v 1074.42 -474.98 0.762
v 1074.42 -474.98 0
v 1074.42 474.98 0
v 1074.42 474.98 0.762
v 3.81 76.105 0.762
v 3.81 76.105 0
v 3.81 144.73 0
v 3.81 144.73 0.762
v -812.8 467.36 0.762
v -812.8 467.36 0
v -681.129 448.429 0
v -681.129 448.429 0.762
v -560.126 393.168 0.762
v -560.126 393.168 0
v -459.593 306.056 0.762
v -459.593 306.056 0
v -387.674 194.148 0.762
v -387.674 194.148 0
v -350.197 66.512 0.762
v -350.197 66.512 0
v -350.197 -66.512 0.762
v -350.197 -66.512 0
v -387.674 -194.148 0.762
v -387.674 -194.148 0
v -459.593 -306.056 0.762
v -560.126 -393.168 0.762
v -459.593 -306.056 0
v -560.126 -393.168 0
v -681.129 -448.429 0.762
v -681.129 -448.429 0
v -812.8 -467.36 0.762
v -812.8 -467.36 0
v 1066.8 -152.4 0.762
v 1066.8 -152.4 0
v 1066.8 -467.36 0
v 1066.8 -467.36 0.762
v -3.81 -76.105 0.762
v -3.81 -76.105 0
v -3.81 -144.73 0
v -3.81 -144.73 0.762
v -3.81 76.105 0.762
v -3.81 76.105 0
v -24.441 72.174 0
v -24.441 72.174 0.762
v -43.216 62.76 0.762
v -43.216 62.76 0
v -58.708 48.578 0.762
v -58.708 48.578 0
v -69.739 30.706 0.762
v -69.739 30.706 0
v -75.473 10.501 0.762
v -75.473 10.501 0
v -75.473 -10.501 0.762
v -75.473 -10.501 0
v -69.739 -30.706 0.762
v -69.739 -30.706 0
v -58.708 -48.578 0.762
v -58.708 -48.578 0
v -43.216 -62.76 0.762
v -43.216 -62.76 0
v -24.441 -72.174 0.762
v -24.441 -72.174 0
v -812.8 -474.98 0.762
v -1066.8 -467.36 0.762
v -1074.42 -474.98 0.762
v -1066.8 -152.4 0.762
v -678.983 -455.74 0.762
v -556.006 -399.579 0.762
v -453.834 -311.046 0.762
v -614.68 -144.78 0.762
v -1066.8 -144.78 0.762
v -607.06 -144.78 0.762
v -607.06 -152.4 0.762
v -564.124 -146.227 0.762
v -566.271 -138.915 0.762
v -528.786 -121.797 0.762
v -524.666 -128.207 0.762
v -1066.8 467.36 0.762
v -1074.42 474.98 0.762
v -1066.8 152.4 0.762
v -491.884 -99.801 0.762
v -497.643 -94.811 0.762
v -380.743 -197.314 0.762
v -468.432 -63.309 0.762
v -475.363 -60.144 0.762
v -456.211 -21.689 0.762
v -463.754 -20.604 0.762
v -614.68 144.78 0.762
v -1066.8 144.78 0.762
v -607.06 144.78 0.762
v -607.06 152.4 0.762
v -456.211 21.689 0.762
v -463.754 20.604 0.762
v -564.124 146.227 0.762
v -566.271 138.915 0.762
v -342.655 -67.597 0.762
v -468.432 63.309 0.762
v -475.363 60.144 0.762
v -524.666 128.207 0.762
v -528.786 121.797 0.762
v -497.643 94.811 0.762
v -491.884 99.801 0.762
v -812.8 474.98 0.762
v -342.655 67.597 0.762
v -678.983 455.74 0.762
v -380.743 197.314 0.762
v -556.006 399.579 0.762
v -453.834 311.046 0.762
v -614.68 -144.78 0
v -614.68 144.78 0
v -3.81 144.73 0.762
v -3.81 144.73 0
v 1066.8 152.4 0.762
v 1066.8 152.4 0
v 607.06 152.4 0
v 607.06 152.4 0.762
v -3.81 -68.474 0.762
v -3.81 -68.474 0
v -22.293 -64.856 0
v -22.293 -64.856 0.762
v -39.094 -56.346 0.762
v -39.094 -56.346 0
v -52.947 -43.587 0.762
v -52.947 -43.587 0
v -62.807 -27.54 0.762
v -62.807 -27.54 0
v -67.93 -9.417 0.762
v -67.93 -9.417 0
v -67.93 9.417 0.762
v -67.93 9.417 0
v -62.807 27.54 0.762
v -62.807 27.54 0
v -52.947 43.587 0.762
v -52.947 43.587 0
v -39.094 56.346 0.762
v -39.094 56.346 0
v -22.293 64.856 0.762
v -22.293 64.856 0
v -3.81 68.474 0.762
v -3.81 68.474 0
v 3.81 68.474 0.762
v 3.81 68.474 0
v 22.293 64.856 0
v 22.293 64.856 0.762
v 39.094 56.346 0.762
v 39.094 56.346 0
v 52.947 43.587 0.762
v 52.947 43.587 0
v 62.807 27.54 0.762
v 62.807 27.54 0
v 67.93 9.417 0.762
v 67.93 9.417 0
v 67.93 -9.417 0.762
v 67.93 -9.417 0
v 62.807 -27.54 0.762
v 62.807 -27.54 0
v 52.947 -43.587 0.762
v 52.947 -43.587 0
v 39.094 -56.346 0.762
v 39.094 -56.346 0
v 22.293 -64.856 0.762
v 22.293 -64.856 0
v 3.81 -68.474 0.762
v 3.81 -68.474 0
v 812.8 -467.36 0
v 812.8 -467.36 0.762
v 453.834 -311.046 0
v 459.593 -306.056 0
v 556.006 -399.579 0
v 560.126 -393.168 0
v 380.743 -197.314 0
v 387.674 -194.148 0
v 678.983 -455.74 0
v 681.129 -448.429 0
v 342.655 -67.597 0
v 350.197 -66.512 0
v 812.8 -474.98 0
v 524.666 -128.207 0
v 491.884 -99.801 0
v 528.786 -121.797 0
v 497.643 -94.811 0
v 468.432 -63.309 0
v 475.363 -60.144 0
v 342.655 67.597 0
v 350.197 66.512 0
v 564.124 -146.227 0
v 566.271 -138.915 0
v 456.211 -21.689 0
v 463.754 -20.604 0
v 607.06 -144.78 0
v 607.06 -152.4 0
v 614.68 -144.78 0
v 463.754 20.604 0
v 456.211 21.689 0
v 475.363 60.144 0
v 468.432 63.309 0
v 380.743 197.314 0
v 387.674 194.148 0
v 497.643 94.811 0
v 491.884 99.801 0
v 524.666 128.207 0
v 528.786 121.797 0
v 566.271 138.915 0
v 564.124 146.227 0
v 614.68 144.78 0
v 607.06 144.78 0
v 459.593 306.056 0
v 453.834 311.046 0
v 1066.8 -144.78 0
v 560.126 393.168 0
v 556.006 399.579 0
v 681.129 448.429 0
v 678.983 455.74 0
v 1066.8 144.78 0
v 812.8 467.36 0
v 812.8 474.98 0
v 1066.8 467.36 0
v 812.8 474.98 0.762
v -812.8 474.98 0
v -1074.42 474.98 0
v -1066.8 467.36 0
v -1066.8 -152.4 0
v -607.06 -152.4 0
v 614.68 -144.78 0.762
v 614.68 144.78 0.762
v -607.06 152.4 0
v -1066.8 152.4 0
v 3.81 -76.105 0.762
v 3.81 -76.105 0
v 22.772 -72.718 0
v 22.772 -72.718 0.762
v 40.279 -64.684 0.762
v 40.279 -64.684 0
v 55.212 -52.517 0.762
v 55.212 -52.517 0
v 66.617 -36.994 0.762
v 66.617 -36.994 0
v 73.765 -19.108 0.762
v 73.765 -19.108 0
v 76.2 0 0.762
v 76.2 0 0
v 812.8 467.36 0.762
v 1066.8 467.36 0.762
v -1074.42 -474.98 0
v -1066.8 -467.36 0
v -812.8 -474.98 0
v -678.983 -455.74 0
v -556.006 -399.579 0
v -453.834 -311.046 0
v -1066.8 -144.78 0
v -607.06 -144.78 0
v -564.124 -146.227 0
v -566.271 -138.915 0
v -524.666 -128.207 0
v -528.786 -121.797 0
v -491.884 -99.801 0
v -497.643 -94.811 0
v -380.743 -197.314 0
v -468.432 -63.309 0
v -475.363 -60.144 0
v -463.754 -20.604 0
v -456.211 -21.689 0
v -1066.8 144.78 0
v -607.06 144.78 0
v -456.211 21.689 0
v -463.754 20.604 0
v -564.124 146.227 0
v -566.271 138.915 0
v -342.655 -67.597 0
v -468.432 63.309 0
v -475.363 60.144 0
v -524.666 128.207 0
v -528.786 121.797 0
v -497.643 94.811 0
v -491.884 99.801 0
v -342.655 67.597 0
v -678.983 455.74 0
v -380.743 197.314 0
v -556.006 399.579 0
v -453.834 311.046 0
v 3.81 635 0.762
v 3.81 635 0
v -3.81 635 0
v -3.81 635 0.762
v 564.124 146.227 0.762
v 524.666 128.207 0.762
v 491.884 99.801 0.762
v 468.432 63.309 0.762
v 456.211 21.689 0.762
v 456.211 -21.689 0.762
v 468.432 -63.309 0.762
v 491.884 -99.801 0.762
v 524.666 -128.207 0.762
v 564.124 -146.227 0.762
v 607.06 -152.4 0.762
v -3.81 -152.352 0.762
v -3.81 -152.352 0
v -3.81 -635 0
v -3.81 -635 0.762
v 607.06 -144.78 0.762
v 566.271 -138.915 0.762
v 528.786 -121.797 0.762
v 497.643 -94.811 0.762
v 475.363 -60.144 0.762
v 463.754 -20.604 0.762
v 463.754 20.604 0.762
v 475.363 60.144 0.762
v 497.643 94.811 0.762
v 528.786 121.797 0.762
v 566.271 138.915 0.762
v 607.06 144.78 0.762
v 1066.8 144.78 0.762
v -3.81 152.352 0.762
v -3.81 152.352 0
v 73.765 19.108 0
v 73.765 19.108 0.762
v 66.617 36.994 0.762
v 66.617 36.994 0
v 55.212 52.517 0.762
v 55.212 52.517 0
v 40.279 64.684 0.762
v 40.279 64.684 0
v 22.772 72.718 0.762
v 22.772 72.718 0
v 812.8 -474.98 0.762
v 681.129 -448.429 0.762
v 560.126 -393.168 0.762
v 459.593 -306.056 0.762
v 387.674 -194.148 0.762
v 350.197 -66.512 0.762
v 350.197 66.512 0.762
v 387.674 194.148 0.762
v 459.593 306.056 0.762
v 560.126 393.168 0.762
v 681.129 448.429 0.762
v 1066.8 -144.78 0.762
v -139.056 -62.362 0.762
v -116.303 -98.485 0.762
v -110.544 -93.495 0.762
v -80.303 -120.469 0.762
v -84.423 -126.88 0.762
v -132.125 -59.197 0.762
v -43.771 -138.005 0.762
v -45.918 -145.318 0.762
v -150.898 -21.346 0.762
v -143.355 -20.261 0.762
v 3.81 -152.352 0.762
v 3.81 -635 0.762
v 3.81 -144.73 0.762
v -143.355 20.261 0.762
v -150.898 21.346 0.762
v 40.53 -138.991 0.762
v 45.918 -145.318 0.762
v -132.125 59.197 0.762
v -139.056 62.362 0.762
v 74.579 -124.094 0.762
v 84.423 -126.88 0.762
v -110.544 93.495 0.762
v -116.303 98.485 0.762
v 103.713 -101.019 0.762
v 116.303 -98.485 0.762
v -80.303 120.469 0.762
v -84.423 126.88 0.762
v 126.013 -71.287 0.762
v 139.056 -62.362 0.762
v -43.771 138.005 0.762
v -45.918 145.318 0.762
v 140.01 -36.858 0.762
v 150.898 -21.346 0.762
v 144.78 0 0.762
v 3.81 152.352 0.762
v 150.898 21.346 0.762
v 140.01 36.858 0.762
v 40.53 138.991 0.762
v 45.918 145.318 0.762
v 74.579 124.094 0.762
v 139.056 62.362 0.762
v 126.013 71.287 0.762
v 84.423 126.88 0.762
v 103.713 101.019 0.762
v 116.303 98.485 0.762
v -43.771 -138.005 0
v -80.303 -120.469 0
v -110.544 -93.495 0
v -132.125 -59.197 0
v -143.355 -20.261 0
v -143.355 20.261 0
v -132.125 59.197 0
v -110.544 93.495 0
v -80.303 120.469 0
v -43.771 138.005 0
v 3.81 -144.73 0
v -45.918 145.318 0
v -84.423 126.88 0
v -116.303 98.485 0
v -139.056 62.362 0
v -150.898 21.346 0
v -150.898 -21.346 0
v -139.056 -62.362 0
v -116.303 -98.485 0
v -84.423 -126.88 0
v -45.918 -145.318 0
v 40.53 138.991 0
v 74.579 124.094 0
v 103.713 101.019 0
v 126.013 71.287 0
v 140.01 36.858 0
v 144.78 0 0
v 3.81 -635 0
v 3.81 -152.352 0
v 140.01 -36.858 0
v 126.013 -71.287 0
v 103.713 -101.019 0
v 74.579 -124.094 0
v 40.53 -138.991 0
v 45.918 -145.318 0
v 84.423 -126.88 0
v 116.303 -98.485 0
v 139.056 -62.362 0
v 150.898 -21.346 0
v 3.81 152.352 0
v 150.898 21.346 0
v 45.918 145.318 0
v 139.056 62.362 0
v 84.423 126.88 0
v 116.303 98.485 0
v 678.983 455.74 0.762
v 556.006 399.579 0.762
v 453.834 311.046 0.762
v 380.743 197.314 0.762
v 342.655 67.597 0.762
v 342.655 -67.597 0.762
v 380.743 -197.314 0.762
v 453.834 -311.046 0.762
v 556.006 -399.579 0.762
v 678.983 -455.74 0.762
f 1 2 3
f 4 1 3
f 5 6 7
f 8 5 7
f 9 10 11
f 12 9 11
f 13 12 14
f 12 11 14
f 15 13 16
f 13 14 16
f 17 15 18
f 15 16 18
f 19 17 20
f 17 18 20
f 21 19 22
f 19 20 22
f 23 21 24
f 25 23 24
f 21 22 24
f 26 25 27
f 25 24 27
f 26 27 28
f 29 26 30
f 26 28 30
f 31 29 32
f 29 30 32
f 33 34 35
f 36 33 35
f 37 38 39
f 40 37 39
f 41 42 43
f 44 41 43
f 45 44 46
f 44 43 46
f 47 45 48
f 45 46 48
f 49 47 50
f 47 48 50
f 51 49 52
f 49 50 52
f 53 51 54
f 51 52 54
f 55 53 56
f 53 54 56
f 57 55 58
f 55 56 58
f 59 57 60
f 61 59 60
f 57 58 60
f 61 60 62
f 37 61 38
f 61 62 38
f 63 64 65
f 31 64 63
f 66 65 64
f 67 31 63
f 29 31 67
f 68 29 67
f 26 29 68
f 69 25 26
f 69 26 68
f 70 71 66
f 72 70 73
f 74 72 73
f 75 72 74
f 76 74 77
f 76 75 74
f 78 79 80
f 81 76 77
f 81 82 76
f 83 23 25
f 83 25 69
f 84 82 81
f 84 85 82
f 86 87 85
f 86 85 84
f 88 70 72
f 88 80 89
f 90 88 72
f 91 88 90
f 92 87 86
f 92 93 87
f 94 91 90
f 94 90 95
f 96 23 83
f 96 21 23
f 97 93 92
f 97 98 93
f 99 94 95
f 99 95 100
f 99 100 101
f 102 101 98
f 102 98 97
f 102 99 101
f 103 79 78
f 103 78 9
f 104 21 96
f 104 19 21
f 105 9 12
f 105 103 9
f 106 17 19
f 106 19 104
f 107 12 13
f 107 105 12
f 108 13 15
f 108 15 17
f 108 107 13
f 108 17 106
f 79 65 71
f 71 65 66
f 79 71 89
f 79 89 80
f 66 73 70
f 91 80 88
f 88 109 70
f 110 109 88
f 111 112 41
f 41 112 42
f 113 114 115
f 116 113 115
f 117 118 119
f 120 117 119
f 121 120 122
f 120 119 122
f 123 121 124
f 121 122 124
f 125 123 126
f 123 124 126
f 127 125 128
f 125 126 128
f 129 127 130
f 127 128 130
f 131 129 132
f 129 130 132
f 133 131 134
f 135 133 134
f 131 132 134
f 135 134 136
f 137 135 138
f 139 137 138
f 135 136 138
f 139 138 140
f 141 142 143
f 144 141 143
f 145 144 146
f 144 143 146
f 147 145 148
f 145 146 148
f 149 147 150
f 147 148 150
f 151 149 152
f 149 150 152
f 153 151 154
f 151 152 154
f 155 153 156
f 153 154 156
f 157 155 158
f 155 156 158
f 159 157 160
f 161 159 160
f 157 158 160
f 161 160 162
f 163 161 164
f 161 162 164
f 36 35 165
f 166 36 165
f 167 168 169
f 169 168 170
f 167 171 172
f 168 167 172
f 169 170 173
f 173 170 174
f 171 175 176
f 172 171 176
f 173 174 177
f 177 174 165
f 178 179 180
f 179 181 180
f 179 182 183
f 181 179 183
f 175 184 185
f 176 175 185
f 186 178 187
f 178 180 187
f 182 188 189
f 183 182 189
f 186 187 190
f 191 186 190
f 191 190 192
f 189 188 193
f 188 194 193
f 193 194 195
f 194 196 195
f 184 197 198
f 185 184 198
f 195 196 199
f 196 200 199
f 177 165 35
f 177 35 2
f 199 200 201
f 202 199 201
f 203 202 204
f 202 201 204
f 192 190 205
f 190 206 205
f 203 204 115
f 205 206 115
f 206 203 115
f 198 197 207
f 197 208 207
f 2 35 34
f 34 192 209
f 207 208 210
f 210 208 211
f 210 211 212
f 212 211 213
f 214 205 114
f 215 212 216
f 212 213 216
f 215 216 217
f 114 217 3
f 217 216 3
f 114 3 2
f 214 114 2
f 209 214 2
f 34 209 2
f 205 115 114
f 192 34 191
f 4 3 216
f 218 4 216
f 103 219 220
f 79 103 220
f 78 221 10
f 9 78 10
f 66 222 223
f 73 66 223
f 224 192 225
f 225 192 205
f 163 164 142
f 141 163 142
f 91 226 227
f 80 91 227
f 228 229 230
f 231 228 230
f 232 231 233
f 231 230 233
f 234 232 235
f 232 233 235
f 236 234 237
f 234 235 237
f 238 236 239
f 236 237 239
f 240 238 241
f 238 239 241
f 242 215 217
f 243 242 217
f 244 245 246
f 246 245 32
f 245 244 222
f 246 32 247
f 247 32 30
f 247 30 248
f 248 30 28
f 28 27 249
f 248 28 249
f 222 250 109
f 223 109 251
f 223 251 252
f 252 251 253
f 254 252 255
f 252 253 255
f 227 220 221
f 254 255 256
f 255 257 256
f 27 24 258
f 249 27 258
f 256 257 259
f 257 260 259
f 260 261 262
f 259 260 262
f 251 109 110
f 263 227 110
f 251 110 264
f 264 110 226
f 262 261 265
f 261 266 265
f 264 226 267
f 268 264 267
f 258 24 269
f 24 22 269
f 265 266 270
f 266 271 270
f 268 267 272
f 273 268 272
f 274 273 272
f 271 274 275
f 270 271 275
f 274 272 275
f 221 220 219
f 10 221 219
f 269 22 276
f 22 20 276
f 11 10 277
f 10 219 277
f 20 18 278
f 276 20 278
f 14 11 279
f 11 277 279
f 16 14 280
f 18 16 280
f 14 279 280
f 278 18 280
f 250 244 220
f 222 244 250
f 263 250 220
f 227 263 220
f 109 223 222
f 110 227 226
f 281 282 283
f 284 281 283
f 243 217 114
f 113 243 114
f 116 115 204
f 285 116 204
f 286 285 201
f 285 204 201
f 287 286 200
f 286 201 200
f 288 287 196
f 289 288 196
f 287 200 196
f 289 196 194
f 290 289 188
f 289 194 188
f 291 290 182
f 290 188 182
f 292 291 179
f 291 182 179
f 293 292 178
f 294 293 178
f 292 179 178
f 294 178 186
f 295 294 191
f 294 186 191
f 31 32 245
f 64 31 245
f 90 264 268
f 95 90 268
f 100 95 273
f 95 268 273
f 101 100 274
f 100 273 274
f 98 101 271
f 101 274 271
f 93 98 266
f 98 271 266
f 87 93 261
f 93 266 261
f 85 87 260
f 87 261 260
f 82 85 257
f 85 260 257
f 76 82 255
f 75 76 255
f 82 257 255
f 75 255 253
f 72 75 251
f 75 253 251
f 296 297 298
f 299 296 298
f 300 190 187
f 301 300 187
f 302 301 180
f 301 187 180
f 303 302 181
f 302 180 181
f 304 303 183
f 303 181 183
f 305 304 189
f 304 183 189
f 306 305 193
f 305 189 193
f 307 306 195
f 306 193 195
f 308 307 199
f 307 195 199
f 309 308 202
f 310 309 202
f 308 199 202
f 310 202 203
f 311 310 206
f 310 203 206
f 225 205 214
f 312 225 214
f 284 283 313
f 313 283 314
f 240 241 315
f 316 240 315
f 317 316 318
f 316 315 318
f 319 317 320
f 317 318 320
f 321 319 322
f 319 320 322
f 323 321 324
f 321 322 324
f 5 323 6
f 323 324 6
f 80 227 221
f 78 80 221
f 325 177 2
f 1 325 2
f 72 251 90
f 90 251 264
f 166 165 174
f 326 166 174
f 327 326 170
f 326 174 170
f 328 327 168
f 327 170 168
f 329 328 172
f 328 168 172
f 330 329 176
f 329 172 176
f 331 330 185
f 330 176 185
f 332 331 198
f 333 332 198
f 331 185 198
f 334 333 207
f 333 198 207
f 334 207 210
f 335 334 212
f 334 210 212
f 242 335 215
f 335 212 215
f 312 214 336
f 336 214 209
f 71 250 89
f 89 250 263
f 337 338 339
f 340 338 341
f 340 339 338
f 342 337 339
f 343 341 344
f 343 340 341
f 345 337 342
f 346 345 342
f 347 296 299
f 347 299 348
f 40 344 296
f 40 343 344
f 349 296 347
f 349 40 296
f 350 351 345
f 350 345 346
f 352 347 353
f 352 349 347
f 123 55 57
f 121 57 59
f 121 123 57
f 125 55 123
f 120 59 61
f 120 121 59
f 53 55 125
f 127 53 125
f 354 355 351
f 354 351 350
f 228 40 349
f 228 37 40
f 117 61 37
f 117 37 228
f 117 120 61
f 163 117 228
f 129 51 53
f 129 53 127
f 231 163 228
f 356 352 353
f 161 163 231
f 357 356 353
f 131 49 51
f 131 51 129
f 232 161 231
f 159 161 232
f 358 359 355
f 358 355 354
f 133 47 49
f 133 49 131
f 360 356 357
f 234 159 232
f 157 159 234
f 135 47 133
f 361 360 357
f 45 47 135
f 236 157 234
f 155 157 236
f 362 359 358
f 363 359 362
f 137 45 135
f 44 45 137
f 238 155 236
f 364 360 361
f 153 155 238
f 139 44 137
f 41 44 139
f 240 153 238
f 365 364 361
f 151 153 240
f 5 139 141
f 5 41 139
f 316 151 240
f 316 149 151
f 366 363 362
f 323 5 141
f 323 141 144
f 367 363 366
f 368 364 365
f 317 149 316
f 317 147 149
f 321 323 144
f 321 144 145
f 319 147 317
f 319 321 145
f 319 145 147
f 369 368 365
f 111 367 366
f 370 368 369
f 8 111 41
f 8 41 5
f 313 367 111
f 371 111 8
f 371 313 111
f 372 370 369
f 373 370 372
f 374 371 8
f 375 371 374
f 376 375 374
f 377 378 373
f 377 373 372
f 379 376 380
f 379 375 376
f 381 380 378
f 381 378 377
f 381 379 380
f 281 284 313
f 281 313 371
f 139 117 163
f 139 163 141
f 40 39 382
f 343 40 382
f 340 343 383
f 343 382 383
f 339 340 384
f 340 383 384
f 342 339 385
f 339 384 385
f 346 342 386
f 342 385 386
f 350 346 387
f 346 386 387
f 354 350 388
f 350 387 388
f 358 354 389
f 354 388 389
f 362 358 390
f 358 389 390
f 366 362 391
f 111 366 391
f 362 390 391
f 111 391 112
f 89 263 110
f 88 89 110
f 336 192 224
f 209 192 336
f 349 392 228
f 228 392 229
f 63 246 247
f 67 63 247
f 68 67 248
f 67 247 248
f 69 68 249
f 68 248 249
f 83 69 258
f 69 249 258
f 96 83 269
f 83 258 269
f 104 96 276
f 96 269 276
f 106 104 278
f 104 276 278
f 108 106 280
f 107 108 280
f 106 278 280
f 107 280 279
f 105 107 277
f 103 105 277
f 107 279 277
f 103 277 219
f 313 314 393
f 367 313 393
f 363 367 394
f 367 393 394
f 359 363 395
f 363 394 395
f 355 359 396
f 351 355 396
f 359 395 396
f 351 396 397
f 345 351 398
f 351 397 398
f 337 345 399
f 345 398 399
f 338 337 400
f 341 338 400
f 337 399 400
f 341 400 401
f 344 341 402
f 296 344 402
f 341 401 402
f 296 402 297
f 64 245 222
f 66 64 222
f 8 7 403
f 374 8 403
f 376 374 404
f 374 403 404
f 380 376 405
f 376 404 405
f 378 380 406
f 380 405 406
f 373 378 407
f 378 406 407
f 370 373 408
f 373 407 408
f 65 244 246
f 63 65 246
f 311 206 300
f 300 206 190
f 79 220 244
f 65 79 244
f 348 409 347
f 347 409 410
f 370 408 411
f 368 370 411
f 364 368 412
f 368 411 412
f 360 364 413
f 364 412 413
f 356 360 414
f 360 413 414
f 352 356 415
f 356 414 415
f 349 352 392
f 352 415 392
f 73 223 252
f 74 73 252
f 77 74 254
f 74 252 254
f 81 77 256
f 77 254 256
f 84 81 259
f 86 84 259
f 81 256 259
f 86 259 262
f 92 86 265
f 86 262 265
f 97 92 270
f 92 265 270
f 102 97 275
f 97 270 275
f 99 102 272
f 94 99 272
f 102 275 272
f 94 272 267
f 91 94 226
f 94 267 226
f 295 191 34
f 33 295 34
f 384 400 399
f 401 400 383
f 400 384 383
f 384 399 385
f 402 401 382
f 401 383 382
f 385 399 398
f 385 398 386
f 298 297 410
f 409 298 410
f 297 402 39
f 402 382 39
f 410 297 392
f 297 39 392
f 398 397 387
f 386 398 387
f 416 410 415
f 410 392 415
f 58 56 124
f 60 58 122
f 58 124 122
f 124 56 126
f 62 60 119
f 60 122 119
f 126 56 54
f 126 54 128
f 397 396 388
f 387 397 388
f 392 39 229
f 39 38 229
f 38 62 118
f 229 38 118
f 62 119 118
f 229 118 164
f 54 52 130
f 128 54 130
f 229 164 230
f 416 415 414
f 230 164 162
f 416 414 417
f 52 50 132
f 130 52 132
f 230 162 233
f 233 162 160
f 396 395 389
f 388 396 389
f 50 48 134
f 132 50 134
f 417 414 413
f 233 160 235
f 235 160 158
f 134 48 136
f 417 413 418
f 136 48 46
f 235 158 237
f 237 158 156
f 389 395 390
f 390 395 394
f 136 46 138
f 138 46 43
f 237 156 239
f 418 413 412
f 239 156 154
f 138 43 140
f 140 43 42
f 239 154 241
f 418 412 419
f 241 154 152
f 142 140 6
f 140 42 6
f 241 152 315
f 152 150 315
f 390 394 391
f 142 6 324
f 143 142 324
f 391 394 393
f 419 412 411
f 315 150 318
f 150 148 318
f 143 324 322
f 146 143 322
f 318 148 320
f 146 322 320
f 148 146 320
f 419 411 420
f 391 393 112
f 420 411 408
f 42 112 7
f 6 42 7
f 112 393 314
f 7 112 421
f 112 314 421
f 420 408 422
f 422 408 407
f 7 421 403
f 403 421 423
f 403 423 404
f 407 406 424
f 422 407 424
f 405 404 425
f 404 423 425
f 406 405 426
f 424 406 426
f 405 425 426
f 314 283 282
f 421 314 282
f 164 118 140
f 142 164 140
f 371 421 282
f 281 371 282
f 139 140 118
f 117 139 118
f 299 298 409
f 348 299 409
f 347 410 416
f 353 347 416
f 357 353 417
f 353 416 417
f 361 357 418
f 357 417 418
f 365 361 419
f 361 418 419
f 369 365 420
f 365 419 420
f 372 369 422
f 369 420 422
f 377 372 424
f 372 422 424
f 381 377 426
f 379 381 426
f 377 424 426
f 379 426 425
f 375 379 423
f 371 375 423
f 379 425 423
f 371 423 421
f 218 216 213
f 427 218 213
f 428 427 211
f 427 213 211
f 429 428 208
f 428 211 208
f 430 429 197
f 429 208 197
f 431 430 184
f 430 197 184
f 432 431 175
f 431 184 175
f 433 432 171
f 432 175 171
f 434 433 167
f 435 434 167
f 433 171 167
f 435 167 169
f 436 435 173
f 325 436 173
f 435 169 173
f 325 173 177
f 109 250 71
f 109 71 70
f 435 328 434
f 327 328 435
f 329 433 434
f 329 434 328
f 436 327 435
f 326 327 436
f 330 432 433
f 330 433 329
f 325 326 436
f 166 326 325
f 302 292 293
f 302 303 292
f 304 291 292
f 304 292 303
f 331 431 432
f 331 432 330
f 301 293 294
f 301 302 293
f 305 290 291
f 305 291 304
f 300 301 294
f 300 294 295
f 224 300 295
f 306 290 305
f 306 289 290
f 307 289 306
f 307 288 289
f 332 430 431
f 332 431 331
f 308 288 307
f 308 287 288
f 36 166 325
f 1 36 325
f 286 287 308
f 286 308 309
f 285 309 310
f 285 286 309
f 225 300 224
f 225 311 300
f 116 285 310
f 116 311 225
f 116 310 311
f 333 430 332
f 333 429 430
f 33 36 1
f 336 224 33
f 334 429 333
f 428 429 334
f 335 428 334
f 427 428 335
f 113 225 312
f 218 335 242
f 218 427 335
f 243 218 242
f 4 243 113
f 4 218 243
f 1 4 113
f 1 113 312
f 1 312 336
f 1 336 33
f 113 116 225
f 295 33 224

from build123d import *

# Parameters (mm, degrees)
F0_W     = 254
F0_H     = 7.62
F0_W_2   = 7.62
F0_H_2   = 289.56
F0_W_3   = 452.12
F1_DEPTH = 0.762


with BuildPart() as f1:
    # F0 (on Top) → F1 (new body)
    with BuildSketch(Plane.XY):
        with BuildLine():
            Line((-1066.8, -467.36), (-1066.8, -474.98))
            Line((-1066.8, -474.98), (-812.8, -474.98))
            ThreePointArc((-812.8, -474.98), (-337.82, 0), (-812.8, 474.98))
            Line((-812.8, 474.98), (-812.8, 467.36))
            ThreePointArc((-812.8, 467.36), (-345.44, 0), (-812.8, -467.36))
            Line((-812.8, -467.36), (-1066.8, -467.36))
        make_face()
        with Locations((-939.8, 471.17)):
            Rectangle(F0_W, F0_H)
        with Locations((-610.87, 0)):
            Rectangle(F0_W_2, F0_H_2)
        with Locations((-840.74, 148.59)):
            Rectangle(F0_W_3, F0_H)
        with Locations((-610.87, 148.59)):
            Rectangle(F0_W_2, F0_H)
        with BuildLine():
            Line((-607.06, -144.78), (-607.06, -152.4))
            ThreePointArc((-607.06, -152.4), (-454.66, 0), (-607.06, 152.4))
            Line((-607.06, 152.4), (-607.06, 144.78))
            ThreePointArc((-607.06, 144.78), (-462.28, 0), (-607.06, -144.78))
        make_face()
        with Locations((-840.74, -148.59)):
            Rectangle(F0_W_3, F0_H)
        with Locations((-610.87, -148.59)):
            Rectangle(F0_W_2, F0_H)
        Polygon((-1074.42, -474.98), (-1066.8, -474.98), (-1066.8, -467.36), (-1066.8, -152.4), (-1066.8, -144.78), (-1066.8, 144.78), (-1066.8, 152.4), (-1066.8, 467.36), (-1066.8, 474.98), (-1074.42, 474.98), align=None)
    extrude(amount=F1_DEPTH)


with BuildPart() as f1b:
    # F0 (on Top) → F1, piece 2 (new body)
    with BuildSketch(Plane.XY):
        with BuildLine():
            ThreePointArc((-3.81, 76.1046903942), (-76.2, 0), (-3.81, -76.1046903942))
            Line((-3.81, -76.1046903942), (-3.81, -68.4740848789))
            ThreePointArc((-3.81, -68.4740848789), (-68.58, 0), (-3.81, 68.4740848789))
            Line((-3.81, 68.4740848789), (-3.81, 76.1046903942))
        make_face()
        with BuildLine():
            Line((3.81, -68.4740848789), (3.81, -76.1046903942))
            ThreePointArc((3.81, -76.1046903942), (55.212145403, -52.5172257455), (76.2, 0))
            ThreePointArc((76.2, 0), (55.212145403, 52.5172257455), (3.81, 76.1046903942))
            Line((3.81, 76.1046903942), (3.81, 68.4740848789))
            ThreePointArc((3.81, 68.4740848789), (49.8222149247, 47.1270973008), (68.58, 0))
            ThreePointArc((68.58, 0), (49.8222149247, -47.1270973008), (3.81, -68.4740848789))
        make_face()
        with BuildLine():
            ThreePointArc((3.81, 76.1046903942), (1.9055959646, 76.176168872), (0, 76.2))
            Line((0, 76.2), (0, 68.58))
            ThreePointArc((0, 68.58), (1.9057359479, 68.553516106), (3.81, 68.4740848789))
            Line((3.81, 68.4740848789), (3.81, 76.1046903942))
        make_face()
        with BuildLine():
            ThreePointArc((0, 76.2), (-1.9055959646, 76.176168872), (-3.81, 76.1046903942))
            Line((-3.81, 76.1046903942), (-3.81, 68.4740848789))
            ThreePointArc((-3.81, 68.4740848789), (-1.9057359479, 68.553516106), (0, 68.58))
            Line((0, 68.58), (0, 76.2))
        make_face()
        with BuildLine():
            ThreePointArc((-3.81, 152.3523675563), (-152.4, 0), (-3.81, -152.3523675563))
            Line((-3.81, -152.3523675563), (-3.81, -144.7298597388))
            ThreePointArc((-3.81, -144.7298597388), (-144.78, 0), (-3.81, 144.7298597388))
            Line((-3.81, 144.7298597388), (-3.81, 152.3523675563))
        make_face()
        with BuildLine():
            ThreePointArc((0, 152.4), (-1.9051488688, 152.3880914238), (-3.81, 152.3523675563))
            Line((-3.81, 152.3523675563), (-3.81, 144.7298597388))
            ThreePointArc((-3.81, 144.7298597388), (-1.9051649565, 144.767464392), (0, 144.78))
            Line((0, 144.78), (0, 152.4))
        make_face()
        with BuildLine():
            ThreePointArc((3.81, 152.3523675563), (1.9051488688, 152.3880914238), (0, 152.4))
            Line((0, 152.4), (0, 144.78))
            ThreePointArc((0, 144.78), (1.9051649565, 144.767464392), (3.81, 144.7298597388))
            Line((3.81, 144.7298597388), (3.81, 152.3523675563))
        make_face()
        with BuildLine():
            Line((3.81, -144.7298597388), (3.81, -152.3523675563))
            ThreePointArc((3.81, -152.3523675563), (109.1017965022, -106.4075091335), (152.4, 0))
            ThreePointArc((152.4, 0), (109.1017965022, 106.4075091335), (3.81, 152.3523675563))
            Line((3.81, 152.3523675563), (3.81, 144.7298597388))
            ThreePointArc((3.81, 144.7298597388), (103.7132108268, 101.0189007067), (144.78, 0))
            ThreePointArc((144.78, 0), (103.7132108268, -101.0189007067), (3.81, -144.7298597388))
        make_face()
        with BuildLine():
            Line((-3.81, -68.4740848789), (-3.81, -76.1046903942))
            ThreePointArc((-3.81, -76.1046903942), (-1.9055959646, -76.176168872), (0, -76.2))
            Line((0, -76.2), (0, -68.58))
            ThreePointArc((0, -68.58), (-1.9057359479, -68.553516106), (-3.81, -68.4740848789))
        make_face()
        with BuildLine():
            Line((0, -68.58), (0, -76.2))
            ThreePointArc((0, -76.2), (1.9055959646, -76.176168872), (3.81, -76.1046903942))
            Line((3.81, -76.1046903942), (3.81, -68.4740848789))
            ThreePointArc((3.81, -68.4740848789), (1.9057359479, -68.553516106), (0, -68.58))
        make_face()
        with BuildLine():
            Line((-3.81, -144.7298597388), (-3.81, -152.3523675563))
            ThreePointArc((-3.81, -152.3523675563), (-1.9051488688, -152.3880914238), (0, -152.4))
            Line((0, -152.4), (0, -144.78))
            ThreePointArc((0, -144.78), (-1.9051649565, -144.767464392), (-3.81, -144.7298597388))
        make_face()
        with BuildLine():
            Line((0, -144.78), (0, -152.4))
            ThreePointArc((0, -152.4), (1.9051488688, -152.3880914238), (3.81, -152.3523675563))
            Line((3.81, -152.3523675563), (3.81, -144.7298597388))
            ThreePointArc((3.81, -144.7298597388), (1.9051649565, -144.767464392), (0, -144.78))
        make_face()
        with BuildLine():
            Line((-3.81, 635), (-3.81, 152.3523675563))
            ThreePointArc((-3.81, 152.3523675563), (-1.9051488688, 152.3880914238), (0, 152.4))
            Line((0, 152.4), (0, 635))
            Line((0, 635), (-3.81, 635))
        make_face()
        with BuildLine():
            Line((0, 635), (0, 152.4))
            ThreePointArc((0, 152.4), (1.9051488688, 152.3880914238), (3.81, 152.3523675563))
            Line((3.81, 152.3523675563), (3.81, 635))
            Line((3.81, 635), (0, 635))
        make_face()
        with BuildLine():
            ThreePointArc((0, 144.78), (-1.9051649565, 144.767464392), (-3.81, 144.7298597388))
            Line((-3.81, 144.7298597388), (-3.81, 76.1046903942))
            ThreePointArc((-3.81, 76.1046903942), (-1.9055959646, 76.176168872), (0, 76.2))
            Line((0, 76.2), (0, 144.78))
        make_face()
        with BuildLine():
            ThreePointArc((3.81, 144.7298597388), (1.9051649565, 144.767464392), (0, 144.78))
            Line((0, 144.78), (0, 76.2))
            ThreePointArc((0, 76.2), (1.9055959646, 76.176168872), (3.81, 76.1046903942))
            Line((3.81, 76.1046903942), (3.81, 144.7298597388))
        make_face()
        with BuildLine():
            Line((-3.81, 68.4740848789), (-3.81, -68.4740848789))
            ThreePointArc((-3.81, -68.4740848789), (-1.9057359479, -68.553516106), (0, -68.58))
            Line((0, -68.58), (0, 68.58))
            ThreePointArc((0, 68.58), (-1.9057359479, 68.553516106), (-3.81, 68.4740848789))
        make_face()
        with BuildLine():
            Line((0, 68.58), (0, -68.58))
            ThreePointArc((0, -68.58), (1.9057359479, -68.553516106), (3.81, -68.4740848789))
            Line((3.81, -68.4740848789), (3.81, 68.4740848789))
            ThreePointArc((3.81, 68.4740848789), (1.9057359479, 68.553516106), (0, 68.58))
        make_face()
        with BuildLine():
            Line((-3.81, -76.1046903942), (-3.81, -144.7298597388))
            ThreePointArc((-3.81, -144.7298597388), (-1.9051649565, -144.767464392), (0, -144.78))
            Line((0, -144.78), (0, -76.2))
            ThreePointArc((0, -76.2), (-1.9055959646, -76.176168872), (-3.81, -76.1046903942))
        make_face()
        with BuildLine():
            Line((0, -76.2), (0, -144.78))
            ThreePointArc((0, -144.78), (1.9051649565, -144.767464392), (3.81, -144.7298597388))
            Line((3.81, -144.7298597388), (3.81, -76.1046903942))
            ThreePointArc((3.81, -76.1046903942), (1.9055959646, -76.176168872), (0, -76.2))
        make_face()
        with BuildLine():
            Line((-3.81, -152.3523675563), (-3.81, -635))
            Line((-3.81, -635), (0, -635))
            Line((0, -635), (0, -152.4))
            ThreePointArc((0, -152.4), (-1.9051488688, -152.3880914238), (-3.81, -152.3523675563))
        make_face()
        with BuildLine():
            Line((0, -152.4), (0, -635))
            Line((0, -635), (3.81, -635))
            Line((3.81, -635), (3.81, -152.3523675563))
            ThreePointArc((3.81, -152.3523675563), (1.9051488688, -152.3880914238), (0, -152.4))
        make_face()
    extrude(amount=F1_DEPTH)


with BuildPart() as f1c:
    # F0 (on Top) → F1, piece 3 (new body)
    with BuildSketch(Plane.XY):
        with BuildLine():
            Line((812.8, -474.98), (1066.8, -474.98))
            Line((1066.8, -474.98), (1066.8, -467.36))
            Line((1066.8, -467.36), (812.8, -467.36))
            ThreePointArc((812.8, -467.36), (345.44, 0), (812.8, 467.36))
            Line((812.8, 467.36), (1066.8, 467.36))
            Line((1066.8, 467.36), (1066.8, 474.98))
            Line((1066.8, 474.98), (812.8, 474.98))
            ThreePointArc((812.8, 474.98), (337.82, 0), (812.8, -474.98))
        make_face()
        with Locations((840.74, 148.59)):
            Rectangle(F0_W_3, F0_H)
        with Locations((610.87, 148.59)):
            Rectangle(F0_W_2, F0_H)
        with Locations((610.87, 0)):
            Rectangle(F0_W_2, F0_H_2)
        with BuildLine():
            ThreePointArc((607.06, 152.4), (454.66, 0), (607.06, -152.4))
            Line((607.06, -152.4), (607.06, -144.78))
            ThreePointArc((607.06, -144.78), (462.28, 0), (607.06, 144.78))
            Line((607.06, 144.78), (607.06, 152.4))
        make_face()
        with Locations((840.74, -148.59)):
            Rectangle(F0_W_3, F0_H)
        with Locations((610.87, -148.59)):
            Rectangle(F0_W_2, F0_H)
        Polygon((1066.8, -467.36), (1066.8, -474.98), (1074.42, -474.98), (1074.42, 474.98), (1066.8, 474.98), (1066.8, 467.36), (1066.8, 152.4), (1066.8, 144.78), (1066.8, -144.78), (1066.8, -152.4), align=None)
    extrude(amount=F1_DEPTH)


solid = Compound([f1.part, f1b.part, f1c.part])
